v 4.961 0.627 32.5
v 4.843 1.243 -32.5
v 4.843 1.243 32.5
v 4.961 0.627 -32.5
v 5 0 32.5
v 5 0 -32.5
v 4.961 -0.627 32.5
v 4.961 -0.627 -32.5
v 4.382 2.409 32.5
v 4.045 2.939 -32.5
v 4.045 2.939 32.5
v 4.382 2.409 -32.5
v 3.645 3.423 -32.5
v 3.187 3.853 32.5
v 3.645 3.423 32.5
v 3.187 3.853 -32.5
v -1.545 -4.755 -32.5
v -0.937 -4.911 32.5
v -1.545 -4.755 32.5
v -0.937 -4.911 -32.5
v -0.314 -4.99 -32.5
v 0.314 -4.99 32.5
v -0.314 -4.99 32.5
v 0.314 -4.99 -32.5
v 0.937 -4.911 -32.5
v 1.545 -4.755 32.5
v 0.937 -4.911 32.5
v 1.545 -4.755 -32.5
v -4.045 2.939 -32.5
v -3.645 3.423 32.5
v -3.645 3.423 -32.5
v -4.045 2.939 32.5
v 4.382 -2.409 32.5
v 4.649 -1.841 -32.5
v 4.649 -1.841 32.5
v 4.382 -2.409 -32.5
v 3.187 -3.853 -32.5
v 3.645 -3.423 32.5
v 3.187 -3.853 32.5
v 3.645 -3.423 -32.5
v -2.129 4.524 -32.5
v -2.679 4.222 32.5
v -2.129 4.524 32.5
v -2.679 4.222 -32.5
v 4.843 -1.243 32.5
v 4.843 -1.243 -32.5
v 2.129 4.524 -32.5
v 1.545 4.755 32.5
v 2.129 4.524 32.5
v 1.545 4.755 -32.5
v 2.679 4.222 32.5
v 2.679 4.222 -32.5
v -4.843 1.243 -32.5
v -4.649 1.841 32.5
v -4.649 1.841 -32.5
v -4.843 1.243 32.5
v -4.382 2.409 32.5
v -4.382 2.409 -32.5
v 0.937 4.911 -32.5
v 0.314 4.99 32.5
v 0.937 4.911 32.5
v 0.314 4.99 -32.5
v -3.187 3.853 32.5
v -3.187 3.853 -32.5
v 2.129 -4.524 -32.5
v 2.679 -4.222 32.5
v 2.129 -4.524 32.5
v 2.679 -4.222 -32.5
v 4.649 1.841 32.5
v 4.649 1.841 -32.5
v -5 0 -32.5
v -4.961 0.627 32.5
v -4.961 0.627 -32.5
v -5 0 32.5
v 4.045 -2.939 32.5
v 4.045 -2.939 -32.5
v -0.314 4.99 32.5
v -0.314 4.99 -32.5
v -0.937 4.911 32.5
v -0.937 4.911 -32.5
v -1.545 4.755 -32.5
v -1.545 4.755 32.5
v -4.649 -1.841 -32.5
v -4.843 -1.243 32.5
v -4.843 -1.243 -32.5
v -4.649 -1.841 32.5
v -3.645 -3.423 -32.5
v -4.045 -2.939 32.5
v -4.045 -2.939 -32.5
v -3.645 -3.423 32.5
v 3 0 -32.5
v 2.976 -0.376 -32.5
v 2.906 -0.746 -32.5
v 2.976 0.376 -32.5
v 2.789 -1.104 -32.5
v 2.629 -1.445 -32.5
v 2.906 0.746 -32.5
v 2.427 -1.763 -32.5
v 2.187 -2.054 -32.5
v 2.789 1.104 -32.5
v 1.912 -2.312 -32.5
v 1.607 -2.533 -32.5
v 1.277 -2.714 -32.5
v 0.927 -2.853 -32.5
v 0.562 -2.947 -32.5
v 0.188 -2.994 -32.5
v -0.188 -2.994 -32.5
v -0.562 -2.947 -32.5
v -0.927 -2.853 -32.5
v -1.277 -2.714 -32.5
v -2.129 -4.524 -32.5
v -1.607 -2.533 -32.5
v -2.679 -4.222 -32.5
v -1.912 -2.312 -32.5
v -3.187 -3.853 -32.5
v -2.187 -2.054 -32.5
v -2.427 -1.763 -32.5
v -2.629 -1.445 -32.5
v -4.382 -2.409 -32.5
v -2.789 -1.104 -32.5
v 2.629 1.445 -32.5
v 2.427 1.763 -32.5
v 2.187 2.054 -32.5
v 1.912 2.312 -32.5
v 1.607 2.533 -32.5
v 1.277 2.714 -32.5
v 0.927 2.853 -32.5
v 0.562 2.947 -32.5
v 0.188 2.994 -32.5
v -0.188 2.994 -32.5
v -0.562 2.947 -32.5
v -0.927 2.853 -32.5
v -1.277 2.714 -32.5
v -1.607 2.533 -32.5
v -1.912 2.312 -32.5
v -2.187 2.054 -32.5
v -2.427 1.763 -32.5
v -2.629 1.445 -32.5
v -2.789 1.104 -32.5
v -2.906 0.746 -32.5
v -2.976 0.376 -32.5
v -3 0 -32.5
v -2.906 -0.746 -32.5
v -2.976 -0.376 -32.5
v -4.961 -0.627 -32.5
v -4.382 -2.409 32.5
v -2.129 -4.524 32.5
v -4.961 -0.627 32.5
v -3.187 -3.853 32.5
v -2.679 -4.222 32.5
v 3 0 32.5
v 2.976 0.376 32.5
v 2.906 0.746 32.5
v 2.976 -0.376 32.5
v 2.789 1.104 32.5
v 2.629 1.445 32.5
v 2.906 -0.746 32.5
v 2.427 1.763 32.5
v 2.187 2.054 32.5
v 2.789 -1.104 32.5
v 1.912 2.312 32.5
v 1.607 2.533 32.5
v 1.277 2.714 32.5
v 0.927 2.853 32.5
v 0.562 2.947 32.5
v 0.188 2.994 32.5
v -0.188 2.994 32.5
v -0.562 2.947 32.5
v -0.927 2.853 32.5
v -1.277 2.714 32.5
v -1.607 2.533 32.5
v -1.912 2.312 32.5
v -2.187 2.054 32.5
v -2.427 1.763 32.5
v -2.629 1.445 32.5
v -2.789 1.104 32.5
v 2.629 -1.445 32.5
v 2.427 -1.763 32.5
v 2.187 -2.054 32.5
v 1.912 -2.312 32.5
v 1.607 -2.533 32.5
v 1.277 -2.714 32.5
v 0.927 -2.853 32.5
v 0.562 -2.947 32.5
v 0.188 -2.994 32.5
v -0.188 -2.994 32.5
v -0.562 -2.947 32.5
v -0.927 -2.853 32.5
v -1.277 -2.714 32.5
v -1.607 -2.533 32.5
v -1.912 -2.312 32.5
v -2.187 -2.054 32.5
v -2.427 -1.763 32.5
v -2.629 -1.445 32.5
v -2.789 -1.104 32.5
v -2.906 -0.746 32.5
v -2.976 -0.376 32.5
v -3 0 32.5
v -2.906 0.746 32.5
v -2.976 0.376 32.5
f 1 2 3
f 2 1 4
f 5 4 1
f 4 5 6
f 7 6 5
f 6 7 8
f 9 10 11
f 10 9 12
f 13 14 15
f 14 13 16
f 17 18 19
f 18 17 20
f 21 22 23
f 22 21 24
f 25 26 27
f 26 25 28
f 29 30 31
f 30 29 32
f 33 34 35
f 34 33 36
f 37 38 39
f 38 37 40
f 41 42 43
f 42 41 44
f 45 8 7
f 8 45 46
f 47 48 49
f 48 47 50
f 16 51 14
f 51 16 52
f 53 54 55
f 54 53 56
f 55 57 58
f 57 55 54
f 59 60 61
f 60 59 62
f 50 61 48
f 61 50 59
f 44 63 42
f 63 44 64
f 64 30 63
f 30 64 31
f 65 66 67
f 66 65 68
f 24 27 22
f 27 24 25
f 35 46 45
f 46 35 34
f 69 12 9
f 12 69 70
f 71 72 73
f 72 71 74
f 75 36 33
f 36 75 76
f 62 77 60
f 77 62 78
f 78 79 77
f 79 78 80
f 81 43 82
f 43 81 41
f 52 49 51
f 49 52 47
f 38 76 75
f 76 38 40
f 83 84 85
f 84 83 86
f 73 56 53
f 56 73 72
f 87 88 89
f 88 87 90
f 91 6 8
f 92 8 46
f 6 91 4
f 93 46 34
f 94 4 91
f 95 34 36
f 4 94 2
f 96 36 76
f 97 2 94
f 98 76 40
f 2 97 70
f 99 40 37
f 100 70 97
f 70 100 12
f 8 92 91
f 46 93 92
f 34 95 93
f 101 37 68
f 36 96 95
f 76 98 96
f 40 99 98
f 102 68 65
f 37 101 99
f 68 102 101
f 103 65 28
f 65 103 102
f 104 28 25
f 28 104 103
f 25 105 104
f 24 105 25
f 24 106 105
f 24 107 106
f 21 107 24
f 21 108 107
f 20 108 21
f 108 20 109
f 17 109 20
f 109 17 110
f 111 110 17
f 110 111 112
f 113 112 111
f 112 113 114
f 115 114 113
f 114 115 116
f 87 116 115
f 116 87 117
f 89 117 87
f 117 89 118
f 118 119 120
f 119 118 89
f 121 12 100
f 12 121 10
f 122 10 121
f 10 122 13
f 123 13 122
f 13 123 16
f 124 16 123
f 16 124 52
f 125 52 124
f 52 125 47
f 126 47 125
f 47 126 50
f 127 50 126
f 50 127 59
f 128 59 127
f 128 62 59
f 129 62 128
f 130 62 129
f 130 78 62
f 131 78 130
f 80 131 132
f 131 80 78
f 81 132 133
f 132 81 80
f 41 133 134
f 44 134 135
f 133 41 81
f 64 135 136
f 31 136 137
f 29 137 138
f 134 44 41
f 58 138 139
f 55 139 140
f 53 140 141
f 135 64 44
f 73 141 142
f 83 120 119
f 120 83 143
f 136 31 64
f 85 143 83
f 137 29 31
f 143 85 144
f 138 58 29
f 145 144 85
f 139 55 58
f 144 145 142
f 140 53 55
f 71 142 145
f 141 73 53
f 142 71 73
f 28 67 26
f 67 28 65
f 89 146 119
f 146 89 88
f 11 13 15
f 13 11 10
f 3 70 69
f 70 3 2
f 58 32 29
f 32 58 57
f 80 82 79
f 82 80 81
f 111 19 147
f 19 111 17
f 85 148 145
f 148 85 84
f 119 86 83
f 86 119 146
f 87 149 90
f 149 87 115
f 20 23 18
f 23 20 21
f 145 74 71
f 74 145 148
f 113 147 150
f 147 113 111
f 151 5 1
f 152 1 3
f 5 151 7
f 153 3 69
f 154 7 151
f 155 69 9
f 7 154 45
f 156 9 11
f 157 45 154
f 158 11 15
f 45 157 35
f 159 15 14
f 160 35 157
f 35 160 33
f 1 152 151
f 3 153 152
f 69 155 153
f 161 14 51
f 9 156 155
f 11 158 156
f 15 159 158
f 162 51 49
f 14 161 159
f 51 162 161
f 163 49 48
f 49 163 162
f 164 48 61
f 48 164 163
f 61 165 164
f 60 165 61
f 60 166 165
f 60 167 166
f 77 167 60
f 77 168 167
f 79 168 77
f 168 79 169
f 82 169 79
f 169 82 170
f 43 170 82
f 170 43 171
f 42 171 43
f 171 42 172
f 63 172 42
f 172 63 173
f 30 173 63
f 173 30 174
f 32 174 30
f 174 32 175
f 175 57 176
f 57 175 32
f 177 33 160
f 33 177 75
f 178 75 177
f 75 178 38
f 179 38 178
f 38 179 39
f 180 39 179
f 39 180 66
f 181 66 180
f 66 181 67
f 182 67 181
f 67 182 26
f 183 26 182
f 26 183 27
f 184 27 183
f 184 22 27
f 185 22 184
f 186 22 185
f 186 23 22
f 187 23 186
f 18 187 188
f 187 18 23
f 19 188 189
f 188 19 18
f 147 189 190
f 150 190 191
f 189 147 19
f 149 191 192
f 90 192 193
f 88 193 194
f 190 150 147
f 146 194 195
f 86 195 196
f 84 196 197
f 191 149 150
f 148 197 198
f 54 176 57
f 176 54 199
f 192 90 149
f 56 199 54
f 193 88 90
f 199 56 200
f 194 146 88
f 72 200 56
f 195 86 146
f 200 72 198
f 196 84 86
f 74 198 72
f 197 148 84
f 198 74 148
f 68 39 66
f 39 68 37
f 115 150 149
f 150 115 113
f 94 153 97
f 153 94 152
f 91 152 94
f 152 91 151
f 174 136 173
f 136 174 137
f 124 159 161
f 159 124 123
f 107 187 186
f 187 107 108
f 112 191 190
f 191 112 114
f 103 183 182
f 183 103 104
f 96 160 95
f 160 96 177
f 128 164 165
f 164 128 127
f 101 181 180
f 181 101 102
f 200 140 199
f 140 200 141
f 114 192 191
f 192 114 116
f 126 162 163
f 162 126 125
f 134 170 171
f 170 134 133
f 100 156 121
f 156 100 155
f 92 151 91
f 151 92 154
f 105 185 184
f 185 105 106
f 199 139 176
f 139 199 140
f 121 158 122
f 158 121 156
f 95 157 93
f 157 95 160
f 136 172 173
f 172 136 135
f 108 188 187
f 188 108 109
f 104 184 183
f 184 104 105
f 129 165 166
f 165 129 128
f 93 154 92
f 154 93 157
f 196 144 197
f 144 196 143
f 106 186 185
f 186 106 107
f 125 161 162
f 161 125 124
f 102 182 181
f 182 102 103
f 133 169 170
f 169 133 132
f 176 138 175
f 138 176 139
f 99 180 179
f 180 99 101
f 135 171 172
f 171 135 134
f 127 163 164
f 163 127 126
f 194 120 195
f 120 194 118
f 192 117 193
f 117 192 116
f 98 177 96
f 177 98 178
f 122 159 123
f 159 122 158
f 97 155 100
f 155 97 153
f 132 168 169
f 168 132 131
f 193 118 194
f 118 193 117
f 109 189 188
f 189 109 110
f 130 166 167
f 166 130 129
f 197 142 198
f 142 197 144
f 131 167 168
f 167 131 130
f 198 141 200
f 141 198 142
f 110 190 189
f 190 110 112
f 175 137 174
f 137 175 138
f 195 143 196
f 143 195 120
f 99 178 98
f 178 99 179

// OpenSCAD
$fn = 50;


difference() {
	union() {
		translate(v = [0, 0, -32.5000000000]) {
			cylinder(h = 65, r = 5.0000000000);
		}
	}
	union() {
		translate(v = [0, 0, -100.0000000000]) {
			cylinder(h = 200, r = 3.0000000000);
		}
	}
}
